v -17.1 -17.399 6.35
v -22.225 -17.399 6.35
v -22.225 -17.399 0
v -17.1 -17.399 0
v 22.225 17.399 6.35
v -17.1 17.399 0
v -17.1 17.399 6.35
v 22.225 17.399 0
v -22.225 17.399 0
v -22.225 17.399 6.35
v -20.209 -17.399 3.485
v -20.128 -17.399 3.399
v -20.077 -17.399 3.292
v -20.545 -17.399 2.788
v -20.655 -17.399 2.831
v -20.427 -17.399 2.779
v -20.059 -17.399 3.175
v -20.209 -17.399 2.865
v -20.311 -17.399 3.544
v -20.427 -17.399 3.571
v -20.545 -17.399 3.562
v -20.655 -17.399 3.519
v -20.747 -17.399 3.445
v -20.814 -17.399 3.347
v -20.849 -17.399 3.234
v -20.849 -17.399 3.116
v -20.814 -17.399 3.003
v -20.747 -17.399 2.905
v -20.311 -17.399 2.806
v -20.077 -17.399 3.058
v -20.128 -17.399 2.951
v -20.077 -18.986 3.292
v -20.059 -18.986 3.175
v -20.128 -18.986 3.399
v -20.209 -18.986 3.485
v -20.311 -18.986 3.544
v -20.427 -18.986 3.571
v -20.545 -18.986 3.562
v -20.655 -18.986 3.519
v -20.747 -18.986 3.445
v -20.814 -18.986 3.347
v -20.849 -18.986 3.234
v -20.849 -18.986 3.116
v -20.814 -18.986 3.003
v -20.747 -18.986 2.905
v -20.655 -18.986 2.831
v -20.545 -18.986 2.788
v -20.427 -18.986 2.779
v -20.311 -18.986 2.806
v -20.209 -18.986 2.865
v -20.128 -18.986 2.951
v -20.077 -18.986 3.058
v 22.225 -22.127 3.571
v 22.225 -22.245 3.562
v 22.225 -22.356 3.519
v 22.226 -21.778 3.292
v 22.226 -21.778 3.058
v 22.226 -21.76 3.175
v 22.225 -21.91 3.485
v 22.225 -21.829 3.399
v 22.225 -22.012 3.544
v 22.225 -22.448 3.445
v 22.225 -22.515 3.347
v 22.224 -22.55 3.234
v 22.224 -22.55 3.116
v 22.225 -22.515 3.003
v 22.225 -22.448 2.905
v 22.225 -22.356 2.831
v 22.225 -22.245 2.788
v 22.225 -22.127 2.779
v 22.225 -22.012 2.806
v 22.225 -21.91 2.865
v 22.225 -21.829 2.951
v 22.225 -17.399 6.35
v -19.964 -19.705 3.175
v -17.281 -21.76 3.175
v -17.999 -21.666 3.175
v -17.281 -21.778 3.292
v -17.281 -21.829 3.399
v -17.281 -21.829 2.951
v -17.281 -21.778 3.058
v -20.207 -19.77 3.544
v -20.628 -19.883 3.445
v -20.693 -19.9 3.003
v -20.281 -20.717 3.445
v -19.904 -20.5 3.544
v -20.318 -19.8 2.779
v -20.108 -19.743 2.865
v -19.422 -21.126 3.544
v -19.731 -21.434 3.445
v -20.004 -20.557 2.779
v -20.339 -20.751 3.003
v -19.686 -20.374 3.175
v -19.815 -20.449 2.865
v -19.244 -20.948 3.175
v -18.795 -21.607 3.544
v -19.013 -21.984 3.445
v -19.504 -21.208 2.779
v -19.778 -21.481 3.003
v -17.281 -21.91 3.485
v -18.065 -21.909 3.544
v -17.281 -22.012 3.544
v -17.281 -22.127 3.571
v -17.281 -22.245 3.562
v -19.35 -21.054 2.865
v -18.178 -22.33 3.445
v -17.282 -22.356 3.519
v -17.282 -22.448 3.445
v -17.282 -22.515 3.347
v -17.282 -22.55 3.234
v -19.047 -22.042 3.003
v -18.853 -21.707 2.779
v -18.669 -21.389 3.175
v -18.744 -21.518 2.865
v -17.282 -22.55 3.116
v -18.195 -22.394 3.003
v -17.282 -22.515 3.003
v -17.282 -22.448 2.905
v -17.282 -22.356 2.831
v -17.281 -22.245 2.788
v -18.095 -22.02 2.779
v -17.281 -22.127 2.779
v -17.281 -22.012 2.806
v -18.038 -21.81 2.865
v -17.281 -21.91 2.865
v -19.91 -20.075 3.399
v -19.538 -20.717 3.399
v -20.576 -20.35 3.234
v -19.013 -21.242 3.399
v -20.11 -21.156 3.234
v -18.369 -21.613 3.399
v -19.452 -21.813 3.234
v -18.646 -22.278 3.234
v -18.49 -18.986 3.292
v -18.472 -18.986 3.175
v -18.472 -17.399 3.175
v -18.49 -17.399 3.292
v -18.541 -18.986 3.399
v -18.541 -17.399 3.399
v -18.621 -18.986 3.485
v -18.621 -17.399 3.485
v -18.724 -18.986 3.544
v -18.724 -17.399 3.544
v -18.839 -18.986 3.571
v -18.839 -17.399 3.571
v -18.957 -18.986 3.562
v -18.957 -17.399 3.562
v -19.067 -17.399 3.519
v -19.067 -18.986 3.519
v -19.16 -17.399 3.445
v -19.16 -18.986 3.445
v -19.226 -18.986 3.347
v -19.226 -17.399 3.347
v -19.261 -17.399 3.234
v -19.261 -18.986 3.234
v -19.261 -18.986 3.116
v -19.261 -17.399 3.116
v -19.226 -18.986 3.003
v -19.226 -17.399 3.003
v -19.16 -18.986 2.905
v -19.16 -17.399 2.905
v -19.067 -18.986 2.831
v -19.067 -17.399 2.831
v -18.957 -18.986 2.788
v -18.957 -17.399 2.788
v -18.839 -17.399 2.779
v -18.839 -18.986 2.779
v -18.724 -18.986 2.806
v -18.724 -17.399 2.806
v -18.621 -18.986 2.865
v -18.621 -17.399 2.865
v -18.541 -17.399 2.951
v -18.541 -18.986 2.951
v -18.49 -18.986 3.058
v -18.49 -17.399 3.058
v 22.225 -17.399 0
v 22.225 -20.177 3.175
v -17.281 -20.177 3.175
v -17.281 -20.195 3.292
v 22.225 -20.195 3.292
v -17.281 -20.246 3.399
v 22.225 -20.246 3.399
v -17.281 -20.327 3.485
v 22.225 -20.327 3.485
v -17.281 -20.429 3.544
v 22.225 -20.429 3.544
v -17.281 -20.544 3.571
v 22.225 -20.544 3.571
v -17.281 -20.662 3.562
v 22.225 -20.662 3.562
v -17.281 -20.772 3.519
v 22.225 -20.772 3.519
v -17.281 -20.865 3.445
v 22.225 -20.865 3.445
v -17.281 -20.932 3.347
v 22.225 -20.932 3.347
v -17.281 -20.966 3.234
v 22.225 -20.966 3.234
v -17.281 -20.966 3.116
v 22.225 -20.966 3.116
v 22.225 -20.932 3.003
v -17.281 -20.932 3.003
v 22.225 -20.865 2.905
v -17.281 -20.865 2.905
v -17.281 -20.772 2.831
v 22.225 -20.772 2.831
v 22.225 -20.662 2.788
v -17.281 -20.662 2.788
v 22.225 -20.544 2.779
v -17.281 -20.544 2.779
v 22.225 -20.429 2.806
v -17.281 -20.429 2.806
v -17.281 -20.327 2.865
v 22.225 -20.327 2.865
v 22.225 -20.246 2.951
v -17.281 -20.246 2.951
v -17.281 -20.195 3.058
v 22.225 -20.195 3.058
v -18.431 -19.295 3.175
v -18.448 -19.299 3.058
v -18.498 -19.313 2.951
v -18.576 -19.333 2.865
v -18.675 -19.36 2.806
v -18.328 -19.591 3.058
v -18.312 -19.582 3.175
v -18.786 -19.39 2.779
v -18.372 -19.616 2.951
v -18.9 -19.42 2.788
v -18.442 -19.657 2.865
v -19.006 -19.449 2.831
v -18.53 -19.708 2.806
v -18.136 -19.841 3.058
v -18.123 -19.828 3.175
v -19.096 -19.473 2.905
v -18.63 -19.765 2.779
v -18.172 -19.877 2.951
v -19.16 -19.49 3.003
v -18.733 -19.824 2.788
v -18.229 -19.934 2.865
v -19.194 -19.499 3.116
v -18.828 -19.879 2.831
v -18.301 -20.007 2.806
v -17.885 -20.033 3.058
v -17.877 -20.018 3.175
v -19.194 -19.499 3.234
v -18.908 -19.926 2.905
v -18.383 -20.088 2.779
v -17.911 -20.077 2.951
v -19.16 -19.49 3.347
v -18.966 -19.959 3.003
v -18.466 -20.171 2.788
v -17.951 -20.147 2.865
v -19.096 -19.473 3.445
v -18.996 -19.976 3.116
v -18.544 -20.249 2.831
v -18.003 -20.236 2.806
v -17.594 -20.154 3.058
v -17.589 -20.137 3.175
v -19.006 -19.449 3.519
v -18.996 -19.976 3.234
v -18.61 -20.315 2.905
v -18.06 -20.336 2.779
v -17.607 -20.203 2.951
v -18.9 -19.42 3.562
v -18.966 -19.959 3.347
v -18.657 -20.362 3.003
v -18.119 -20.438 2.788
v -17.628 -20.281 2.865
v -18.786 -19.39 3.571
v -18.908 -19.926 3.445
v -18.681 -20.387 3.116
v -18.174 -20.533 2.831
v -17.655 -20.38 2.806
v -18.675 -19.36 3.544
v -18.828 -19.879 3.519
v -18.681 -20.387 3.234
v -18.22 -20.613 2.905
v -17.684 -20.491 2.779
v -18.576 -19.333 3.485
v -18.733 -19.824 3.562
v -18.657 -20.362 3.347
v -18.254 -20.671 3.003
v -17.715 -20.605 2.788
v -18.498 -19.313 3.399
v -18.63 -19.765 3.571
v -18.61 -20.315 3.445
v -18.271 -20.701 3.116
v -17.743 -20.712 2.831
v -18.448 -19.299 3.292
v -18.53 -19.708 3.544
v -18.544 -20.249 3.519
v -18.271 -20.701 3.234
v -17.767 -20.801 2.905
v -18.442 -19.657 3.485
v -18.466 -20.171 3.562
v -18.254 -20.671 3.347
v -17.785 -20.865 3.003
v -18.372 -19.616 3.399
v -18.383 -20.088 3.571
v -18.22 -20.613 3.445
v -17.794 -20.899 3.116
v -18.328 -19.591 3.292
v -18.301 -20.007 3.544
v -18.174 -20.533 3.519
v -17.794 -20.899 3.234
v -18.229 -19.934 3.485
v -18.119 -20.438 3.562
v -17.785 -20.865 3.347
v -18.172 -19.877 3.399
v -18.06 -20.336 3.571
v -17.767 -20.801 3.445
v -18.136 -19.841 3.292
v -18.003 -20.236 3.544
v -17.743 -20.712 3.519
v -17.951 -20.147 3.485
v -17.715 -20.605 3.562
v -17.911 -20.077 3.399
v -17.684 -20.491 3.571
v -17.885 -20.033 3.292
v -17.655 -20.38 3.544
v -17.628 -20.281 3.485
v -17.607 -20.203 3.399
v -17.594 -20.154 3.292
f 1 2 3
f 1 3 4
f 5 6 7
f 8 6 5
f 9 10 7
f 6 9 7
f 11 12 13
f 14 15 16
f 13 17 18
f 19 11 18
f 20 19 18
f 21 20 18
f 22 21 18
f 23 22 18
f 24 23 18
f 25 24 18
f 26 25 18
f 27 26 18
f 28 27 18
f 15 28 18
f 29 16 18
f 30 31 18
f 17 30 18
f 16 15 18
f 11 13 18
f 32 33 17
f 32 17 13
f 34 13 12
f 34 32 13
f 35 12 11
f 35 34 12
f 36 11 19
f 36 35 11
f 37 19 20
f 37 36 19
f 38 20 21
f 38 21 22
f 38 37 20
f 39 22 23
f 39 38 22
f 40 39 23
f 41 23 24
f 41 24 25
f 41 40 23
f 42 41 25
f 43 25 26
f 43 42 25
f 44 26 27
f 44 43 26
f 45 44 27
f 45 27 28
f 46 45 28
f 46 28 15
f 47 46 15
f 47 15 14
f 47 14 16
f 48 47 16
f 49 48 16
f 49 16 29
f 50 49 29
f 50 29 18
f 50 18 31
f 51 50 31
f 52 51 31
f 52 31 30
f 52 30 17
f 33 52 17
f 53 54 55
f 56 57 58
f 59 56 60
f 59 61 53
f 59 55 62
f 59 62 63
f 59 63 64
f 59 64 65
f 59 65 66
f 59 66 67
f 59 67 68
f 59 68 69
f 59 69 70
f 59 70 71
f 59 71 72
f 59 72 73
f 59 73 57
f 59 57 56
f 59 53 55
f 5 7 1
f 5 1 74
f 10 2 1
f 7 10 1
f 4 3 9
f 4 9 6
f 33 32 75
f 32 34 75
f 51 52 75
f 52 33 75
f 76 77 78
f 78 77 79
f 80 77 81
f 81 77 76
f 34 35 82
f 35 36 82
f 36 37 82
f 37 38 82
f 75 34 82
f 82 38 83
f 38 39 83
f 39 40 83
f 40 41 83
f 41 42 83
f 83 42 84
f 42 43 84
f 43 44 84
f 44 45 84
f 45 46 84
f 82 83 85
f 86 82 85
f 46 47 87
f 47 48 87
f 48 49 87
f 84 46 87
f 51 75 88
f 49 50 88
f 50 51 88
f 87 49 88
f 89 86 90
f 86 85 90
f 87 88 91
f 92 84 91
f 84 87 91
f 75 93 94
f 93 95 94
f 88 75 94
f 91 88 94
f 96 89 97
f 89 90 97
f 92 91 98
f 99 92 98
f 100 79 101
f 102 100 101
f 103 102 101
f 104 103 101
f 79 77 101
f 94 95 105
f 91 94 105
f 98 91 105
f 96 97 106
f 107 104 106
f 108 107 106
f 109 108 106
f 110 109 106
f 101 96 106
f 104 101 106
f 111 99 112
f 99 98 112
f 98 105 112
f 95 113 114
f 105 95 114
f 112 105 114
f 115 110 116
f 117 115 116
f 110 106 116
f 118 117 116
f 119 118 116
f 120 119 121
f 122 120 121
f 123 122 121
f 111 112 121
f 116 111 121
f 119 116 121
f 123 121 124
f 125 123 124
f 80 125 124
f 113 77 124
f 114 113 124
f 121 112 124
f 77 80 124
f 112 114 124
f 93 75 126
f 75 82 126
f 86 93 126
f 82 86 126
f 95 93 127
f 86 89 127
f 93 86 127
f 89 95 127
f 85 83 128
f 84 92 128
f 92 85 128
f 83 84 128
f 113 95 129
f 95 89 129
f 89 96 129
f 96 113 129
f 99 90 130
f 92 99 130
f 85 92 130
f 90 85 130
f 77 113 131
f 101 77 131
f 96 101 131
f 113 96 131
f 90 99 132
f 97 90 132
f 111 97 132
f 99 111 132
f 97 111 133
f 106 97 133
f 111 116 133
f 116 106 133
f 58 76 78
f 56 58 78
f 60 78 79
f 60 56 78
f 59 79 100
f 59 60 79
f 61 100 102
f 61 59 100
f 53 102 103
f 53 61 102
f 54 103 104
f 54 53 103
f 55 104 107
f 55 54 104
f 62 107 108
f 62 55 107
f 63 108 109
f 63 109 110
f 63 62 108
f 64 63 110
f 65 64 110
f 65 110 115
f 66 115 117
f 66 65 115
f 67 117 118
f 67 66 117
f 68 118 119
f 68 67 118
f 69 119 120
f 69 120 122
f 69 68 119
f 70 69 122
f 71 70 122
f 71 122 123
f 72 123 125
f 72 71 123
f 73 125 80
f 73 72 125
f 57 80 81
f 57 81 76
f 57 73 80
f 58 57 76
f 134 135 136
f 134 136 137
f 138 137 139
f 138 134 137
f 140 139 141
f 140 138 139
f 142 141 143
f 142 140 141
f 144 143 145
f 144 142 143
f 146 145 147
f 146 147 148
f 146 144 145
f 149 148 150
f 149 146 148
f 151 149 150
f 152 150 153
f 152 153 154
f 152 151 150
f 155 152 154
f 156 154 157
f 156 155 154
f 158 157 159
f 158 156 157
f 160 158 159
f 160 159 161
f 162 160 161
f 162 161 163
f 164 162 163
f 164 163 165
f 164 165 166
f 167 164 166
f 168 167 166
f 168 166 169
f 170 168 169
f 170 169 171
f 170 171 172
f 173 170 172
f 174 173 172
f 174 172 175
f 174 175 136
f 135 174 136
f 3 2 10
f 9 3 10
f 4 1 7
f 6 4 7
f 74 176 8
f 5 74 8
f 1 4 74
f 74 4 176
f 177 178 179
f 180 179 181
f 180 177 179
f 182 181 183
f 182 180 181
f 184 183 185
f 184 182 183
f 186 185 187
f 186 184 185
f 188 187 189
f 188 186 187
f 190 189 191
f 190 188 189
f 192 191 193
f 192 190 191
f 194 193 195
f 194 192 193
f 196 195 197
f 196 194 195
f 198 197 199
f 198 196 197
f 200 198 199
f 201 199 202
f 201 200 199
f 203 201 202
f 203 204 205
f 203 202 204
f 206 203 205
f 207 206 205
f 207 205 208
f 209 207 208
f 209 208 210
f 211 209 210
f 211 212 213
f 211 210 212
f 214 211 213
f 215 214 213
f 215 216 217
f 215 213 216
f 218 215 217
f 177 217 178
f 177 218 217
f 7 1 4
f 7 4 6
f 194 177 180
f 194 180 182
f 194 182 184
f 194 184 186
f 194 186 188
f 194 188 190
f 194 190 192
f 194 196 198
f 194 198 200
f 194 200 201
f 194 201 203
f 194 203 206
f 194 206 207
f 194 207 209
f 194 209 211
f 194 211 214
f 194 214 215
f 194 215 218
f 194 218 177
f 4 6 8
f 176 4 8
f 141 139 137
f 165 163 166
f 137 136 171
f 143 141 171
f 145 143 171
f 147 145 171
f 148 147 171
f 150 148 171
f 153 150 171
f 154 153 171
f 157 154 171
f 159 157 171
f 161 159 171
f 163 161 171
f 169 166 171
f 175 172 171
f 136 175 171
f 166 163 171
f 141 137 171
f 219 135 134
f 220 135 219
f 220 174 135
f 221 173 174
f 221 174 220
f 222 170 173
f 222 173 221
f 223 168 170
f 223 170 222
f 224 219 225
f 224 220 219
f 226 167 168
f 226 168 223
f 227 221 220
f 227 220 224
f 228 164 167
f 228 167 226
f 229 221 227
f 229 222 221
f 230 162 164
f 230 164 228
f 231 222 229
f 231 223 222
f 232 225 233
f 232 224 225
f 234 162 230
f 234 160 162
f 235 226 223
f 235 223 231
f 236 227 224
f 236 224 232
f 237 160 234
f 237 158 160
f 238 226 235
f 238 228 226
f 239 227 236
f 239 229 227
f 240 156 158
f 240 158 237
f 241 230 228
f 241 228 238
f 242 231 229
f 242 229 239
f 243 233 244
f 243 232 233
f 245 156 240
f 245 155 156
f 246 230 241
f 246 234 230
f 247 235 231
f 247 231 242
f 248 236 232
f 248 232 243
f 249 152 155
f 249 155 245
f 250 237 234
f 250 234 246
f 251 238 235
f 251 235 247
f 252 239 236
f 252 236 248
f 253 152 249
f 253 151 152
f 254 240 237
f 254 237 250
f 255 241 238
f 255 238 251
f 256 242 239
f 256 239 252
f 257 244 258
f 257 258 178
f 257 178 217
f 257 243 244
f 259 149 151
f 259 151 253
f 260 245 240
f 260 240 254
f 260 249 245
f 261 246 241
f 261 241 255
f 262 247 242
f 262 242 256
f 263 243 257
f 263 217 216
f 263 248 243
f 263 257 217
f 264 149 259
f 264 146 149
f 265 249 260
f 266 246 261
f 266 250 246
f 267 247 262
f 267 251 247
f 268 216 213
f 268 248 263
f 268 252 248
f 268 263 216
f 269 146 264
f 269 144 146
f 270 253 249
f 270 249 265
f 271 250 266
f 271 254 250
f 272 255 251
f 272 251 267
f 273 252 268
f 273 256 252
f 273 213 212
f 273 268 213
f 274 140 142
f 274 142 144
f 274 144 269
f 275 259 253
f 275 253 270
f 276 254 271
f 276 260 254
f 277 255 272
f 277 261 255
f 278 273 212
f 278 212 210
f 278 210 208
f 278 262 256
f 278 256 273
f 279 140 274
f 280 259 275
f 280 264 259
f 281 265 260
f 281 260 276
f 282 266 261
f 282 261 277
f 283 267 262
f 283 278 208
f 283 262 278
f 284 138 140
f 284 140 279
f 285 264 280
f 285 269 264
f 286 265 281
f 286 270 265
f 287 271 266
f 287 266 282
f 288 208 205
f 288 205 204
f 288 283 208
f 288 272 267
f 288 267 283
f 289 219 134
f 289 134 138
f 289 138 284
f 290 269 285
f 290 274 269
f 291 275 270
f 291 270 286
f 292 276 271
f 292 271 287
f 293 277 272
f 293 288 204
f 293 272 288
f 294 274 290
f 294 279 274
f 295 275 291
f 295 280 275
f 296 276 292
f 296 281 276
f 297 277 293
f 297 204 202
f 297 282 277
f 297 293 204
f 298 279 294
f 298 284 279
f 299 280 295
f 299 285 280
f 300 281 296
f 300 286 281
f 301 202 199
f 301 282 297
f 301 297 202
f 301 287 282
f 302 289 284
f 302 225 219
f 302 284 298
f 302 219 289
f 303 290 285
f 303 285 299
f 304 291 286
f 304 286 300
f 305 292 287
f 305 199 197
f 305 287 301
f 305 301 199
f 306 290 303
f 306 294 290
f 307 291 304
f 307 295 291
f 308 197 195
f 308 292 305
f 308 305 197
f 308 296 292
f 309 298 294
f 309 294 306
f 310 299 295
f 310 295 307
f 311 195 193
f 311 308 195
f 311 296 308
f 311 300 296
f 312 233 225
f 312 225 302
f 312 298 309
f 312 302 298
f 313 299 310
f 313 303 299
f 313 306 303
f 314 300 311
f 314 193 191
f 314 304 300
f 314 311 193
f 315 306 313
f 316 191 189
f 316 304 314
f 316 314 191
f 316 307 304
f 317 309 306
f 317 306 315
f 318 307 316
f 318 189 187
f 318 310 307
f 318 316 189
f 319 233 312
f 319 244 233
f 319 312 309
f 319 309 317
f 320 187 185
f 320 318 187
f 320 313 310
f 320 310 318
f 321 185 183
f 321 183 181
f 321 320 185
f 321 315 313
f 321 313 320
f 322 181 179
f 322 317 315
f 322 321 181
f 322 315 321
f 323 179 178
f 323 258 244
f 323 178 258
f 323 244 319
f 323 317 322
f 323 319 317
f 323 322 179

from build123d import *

# Parameters (mm, degrees)
F0_W     = 44.45
F0_H     = 34.798
F1_DEPTH = 6.35
F2_W     = 5.125
F2_H     = 34.798
F3_DEPTH = 6.351
F4_DEPTH = 6.35
F6_R     = 0.396875


with BuildPart() as f1:
    # F0 (on Top) → F1 (new body)
    with BuildSketch(Plane.XY):
        Rectangle(F0_W, F0_H)
    extrude(amount=F1_DEPTH)

    # F2 (on face) → F3 (cut, through all)
    with BuildSketch(Plane.XY.offset(6.35)):
        with Locations((-19.6625, 0)):
            Rectangle(F2_W, F2_H)
    extrude(amount=-F3_DEPTH, mode=Mode.SUBTRACT)


with BuildPart() as f4:
    # F2 (on face) → F4 (new body, through all)
    with BuildSketch(Plane.XY.offset(6.35)):
        with Locations((-19.6625, 0)):
            Rectangle(F2_W, F2_H)
    extrude(amount=-F4_DEPTH)


with BuildPart() as f8:
    # F8: sweep along a path in F7
    with BuildLine(Plane.XY.offset(3.175)) as f8_path:
        Line((-18.86875, -17.399), (-18.86875, -18.9865))
        ThreePointArc((-18.86875, -18.9865), (-18.4037820151, -20.1090320151), (-17.28125, -20.574))
        Line((-17.28125, -20.574), (22.225, -20.574))
    # F6 (on face) → F8 (sweep)
    with BuildSketch(Plane.XZ.offset(17.399)):
        with Locations((-18.86875, 3.175)):
            Circle(F6_R)
    sweep(path=f8_path.line)


with BuildPart() as f9:
    # F9: sweep along a path in F7
    with BuildLine(Plane.XY.offset(3.175)) as f9_path:
        Line((-20.45625, -17.399), (-20.45625, -18.9865))
        ThreePointArc((-20.45625, -18.9865), (-19.5247475, -21.2286983837), (-17.28125, -22.1570676353))
        Line((-17.28125, -22.1570676353), (22.225, -22.1570676353))
    # F6 (on face) → F9 (sweep)
    with BuildSketch(Plane.XZ.offset(17.399)):
        with Locations((-20.45625, 3.175)):
            Circle(F6_R)
    sweep(path=f9_path.line)


solid = Compound([f1.part, f4.part, f8.part, f9.part])
